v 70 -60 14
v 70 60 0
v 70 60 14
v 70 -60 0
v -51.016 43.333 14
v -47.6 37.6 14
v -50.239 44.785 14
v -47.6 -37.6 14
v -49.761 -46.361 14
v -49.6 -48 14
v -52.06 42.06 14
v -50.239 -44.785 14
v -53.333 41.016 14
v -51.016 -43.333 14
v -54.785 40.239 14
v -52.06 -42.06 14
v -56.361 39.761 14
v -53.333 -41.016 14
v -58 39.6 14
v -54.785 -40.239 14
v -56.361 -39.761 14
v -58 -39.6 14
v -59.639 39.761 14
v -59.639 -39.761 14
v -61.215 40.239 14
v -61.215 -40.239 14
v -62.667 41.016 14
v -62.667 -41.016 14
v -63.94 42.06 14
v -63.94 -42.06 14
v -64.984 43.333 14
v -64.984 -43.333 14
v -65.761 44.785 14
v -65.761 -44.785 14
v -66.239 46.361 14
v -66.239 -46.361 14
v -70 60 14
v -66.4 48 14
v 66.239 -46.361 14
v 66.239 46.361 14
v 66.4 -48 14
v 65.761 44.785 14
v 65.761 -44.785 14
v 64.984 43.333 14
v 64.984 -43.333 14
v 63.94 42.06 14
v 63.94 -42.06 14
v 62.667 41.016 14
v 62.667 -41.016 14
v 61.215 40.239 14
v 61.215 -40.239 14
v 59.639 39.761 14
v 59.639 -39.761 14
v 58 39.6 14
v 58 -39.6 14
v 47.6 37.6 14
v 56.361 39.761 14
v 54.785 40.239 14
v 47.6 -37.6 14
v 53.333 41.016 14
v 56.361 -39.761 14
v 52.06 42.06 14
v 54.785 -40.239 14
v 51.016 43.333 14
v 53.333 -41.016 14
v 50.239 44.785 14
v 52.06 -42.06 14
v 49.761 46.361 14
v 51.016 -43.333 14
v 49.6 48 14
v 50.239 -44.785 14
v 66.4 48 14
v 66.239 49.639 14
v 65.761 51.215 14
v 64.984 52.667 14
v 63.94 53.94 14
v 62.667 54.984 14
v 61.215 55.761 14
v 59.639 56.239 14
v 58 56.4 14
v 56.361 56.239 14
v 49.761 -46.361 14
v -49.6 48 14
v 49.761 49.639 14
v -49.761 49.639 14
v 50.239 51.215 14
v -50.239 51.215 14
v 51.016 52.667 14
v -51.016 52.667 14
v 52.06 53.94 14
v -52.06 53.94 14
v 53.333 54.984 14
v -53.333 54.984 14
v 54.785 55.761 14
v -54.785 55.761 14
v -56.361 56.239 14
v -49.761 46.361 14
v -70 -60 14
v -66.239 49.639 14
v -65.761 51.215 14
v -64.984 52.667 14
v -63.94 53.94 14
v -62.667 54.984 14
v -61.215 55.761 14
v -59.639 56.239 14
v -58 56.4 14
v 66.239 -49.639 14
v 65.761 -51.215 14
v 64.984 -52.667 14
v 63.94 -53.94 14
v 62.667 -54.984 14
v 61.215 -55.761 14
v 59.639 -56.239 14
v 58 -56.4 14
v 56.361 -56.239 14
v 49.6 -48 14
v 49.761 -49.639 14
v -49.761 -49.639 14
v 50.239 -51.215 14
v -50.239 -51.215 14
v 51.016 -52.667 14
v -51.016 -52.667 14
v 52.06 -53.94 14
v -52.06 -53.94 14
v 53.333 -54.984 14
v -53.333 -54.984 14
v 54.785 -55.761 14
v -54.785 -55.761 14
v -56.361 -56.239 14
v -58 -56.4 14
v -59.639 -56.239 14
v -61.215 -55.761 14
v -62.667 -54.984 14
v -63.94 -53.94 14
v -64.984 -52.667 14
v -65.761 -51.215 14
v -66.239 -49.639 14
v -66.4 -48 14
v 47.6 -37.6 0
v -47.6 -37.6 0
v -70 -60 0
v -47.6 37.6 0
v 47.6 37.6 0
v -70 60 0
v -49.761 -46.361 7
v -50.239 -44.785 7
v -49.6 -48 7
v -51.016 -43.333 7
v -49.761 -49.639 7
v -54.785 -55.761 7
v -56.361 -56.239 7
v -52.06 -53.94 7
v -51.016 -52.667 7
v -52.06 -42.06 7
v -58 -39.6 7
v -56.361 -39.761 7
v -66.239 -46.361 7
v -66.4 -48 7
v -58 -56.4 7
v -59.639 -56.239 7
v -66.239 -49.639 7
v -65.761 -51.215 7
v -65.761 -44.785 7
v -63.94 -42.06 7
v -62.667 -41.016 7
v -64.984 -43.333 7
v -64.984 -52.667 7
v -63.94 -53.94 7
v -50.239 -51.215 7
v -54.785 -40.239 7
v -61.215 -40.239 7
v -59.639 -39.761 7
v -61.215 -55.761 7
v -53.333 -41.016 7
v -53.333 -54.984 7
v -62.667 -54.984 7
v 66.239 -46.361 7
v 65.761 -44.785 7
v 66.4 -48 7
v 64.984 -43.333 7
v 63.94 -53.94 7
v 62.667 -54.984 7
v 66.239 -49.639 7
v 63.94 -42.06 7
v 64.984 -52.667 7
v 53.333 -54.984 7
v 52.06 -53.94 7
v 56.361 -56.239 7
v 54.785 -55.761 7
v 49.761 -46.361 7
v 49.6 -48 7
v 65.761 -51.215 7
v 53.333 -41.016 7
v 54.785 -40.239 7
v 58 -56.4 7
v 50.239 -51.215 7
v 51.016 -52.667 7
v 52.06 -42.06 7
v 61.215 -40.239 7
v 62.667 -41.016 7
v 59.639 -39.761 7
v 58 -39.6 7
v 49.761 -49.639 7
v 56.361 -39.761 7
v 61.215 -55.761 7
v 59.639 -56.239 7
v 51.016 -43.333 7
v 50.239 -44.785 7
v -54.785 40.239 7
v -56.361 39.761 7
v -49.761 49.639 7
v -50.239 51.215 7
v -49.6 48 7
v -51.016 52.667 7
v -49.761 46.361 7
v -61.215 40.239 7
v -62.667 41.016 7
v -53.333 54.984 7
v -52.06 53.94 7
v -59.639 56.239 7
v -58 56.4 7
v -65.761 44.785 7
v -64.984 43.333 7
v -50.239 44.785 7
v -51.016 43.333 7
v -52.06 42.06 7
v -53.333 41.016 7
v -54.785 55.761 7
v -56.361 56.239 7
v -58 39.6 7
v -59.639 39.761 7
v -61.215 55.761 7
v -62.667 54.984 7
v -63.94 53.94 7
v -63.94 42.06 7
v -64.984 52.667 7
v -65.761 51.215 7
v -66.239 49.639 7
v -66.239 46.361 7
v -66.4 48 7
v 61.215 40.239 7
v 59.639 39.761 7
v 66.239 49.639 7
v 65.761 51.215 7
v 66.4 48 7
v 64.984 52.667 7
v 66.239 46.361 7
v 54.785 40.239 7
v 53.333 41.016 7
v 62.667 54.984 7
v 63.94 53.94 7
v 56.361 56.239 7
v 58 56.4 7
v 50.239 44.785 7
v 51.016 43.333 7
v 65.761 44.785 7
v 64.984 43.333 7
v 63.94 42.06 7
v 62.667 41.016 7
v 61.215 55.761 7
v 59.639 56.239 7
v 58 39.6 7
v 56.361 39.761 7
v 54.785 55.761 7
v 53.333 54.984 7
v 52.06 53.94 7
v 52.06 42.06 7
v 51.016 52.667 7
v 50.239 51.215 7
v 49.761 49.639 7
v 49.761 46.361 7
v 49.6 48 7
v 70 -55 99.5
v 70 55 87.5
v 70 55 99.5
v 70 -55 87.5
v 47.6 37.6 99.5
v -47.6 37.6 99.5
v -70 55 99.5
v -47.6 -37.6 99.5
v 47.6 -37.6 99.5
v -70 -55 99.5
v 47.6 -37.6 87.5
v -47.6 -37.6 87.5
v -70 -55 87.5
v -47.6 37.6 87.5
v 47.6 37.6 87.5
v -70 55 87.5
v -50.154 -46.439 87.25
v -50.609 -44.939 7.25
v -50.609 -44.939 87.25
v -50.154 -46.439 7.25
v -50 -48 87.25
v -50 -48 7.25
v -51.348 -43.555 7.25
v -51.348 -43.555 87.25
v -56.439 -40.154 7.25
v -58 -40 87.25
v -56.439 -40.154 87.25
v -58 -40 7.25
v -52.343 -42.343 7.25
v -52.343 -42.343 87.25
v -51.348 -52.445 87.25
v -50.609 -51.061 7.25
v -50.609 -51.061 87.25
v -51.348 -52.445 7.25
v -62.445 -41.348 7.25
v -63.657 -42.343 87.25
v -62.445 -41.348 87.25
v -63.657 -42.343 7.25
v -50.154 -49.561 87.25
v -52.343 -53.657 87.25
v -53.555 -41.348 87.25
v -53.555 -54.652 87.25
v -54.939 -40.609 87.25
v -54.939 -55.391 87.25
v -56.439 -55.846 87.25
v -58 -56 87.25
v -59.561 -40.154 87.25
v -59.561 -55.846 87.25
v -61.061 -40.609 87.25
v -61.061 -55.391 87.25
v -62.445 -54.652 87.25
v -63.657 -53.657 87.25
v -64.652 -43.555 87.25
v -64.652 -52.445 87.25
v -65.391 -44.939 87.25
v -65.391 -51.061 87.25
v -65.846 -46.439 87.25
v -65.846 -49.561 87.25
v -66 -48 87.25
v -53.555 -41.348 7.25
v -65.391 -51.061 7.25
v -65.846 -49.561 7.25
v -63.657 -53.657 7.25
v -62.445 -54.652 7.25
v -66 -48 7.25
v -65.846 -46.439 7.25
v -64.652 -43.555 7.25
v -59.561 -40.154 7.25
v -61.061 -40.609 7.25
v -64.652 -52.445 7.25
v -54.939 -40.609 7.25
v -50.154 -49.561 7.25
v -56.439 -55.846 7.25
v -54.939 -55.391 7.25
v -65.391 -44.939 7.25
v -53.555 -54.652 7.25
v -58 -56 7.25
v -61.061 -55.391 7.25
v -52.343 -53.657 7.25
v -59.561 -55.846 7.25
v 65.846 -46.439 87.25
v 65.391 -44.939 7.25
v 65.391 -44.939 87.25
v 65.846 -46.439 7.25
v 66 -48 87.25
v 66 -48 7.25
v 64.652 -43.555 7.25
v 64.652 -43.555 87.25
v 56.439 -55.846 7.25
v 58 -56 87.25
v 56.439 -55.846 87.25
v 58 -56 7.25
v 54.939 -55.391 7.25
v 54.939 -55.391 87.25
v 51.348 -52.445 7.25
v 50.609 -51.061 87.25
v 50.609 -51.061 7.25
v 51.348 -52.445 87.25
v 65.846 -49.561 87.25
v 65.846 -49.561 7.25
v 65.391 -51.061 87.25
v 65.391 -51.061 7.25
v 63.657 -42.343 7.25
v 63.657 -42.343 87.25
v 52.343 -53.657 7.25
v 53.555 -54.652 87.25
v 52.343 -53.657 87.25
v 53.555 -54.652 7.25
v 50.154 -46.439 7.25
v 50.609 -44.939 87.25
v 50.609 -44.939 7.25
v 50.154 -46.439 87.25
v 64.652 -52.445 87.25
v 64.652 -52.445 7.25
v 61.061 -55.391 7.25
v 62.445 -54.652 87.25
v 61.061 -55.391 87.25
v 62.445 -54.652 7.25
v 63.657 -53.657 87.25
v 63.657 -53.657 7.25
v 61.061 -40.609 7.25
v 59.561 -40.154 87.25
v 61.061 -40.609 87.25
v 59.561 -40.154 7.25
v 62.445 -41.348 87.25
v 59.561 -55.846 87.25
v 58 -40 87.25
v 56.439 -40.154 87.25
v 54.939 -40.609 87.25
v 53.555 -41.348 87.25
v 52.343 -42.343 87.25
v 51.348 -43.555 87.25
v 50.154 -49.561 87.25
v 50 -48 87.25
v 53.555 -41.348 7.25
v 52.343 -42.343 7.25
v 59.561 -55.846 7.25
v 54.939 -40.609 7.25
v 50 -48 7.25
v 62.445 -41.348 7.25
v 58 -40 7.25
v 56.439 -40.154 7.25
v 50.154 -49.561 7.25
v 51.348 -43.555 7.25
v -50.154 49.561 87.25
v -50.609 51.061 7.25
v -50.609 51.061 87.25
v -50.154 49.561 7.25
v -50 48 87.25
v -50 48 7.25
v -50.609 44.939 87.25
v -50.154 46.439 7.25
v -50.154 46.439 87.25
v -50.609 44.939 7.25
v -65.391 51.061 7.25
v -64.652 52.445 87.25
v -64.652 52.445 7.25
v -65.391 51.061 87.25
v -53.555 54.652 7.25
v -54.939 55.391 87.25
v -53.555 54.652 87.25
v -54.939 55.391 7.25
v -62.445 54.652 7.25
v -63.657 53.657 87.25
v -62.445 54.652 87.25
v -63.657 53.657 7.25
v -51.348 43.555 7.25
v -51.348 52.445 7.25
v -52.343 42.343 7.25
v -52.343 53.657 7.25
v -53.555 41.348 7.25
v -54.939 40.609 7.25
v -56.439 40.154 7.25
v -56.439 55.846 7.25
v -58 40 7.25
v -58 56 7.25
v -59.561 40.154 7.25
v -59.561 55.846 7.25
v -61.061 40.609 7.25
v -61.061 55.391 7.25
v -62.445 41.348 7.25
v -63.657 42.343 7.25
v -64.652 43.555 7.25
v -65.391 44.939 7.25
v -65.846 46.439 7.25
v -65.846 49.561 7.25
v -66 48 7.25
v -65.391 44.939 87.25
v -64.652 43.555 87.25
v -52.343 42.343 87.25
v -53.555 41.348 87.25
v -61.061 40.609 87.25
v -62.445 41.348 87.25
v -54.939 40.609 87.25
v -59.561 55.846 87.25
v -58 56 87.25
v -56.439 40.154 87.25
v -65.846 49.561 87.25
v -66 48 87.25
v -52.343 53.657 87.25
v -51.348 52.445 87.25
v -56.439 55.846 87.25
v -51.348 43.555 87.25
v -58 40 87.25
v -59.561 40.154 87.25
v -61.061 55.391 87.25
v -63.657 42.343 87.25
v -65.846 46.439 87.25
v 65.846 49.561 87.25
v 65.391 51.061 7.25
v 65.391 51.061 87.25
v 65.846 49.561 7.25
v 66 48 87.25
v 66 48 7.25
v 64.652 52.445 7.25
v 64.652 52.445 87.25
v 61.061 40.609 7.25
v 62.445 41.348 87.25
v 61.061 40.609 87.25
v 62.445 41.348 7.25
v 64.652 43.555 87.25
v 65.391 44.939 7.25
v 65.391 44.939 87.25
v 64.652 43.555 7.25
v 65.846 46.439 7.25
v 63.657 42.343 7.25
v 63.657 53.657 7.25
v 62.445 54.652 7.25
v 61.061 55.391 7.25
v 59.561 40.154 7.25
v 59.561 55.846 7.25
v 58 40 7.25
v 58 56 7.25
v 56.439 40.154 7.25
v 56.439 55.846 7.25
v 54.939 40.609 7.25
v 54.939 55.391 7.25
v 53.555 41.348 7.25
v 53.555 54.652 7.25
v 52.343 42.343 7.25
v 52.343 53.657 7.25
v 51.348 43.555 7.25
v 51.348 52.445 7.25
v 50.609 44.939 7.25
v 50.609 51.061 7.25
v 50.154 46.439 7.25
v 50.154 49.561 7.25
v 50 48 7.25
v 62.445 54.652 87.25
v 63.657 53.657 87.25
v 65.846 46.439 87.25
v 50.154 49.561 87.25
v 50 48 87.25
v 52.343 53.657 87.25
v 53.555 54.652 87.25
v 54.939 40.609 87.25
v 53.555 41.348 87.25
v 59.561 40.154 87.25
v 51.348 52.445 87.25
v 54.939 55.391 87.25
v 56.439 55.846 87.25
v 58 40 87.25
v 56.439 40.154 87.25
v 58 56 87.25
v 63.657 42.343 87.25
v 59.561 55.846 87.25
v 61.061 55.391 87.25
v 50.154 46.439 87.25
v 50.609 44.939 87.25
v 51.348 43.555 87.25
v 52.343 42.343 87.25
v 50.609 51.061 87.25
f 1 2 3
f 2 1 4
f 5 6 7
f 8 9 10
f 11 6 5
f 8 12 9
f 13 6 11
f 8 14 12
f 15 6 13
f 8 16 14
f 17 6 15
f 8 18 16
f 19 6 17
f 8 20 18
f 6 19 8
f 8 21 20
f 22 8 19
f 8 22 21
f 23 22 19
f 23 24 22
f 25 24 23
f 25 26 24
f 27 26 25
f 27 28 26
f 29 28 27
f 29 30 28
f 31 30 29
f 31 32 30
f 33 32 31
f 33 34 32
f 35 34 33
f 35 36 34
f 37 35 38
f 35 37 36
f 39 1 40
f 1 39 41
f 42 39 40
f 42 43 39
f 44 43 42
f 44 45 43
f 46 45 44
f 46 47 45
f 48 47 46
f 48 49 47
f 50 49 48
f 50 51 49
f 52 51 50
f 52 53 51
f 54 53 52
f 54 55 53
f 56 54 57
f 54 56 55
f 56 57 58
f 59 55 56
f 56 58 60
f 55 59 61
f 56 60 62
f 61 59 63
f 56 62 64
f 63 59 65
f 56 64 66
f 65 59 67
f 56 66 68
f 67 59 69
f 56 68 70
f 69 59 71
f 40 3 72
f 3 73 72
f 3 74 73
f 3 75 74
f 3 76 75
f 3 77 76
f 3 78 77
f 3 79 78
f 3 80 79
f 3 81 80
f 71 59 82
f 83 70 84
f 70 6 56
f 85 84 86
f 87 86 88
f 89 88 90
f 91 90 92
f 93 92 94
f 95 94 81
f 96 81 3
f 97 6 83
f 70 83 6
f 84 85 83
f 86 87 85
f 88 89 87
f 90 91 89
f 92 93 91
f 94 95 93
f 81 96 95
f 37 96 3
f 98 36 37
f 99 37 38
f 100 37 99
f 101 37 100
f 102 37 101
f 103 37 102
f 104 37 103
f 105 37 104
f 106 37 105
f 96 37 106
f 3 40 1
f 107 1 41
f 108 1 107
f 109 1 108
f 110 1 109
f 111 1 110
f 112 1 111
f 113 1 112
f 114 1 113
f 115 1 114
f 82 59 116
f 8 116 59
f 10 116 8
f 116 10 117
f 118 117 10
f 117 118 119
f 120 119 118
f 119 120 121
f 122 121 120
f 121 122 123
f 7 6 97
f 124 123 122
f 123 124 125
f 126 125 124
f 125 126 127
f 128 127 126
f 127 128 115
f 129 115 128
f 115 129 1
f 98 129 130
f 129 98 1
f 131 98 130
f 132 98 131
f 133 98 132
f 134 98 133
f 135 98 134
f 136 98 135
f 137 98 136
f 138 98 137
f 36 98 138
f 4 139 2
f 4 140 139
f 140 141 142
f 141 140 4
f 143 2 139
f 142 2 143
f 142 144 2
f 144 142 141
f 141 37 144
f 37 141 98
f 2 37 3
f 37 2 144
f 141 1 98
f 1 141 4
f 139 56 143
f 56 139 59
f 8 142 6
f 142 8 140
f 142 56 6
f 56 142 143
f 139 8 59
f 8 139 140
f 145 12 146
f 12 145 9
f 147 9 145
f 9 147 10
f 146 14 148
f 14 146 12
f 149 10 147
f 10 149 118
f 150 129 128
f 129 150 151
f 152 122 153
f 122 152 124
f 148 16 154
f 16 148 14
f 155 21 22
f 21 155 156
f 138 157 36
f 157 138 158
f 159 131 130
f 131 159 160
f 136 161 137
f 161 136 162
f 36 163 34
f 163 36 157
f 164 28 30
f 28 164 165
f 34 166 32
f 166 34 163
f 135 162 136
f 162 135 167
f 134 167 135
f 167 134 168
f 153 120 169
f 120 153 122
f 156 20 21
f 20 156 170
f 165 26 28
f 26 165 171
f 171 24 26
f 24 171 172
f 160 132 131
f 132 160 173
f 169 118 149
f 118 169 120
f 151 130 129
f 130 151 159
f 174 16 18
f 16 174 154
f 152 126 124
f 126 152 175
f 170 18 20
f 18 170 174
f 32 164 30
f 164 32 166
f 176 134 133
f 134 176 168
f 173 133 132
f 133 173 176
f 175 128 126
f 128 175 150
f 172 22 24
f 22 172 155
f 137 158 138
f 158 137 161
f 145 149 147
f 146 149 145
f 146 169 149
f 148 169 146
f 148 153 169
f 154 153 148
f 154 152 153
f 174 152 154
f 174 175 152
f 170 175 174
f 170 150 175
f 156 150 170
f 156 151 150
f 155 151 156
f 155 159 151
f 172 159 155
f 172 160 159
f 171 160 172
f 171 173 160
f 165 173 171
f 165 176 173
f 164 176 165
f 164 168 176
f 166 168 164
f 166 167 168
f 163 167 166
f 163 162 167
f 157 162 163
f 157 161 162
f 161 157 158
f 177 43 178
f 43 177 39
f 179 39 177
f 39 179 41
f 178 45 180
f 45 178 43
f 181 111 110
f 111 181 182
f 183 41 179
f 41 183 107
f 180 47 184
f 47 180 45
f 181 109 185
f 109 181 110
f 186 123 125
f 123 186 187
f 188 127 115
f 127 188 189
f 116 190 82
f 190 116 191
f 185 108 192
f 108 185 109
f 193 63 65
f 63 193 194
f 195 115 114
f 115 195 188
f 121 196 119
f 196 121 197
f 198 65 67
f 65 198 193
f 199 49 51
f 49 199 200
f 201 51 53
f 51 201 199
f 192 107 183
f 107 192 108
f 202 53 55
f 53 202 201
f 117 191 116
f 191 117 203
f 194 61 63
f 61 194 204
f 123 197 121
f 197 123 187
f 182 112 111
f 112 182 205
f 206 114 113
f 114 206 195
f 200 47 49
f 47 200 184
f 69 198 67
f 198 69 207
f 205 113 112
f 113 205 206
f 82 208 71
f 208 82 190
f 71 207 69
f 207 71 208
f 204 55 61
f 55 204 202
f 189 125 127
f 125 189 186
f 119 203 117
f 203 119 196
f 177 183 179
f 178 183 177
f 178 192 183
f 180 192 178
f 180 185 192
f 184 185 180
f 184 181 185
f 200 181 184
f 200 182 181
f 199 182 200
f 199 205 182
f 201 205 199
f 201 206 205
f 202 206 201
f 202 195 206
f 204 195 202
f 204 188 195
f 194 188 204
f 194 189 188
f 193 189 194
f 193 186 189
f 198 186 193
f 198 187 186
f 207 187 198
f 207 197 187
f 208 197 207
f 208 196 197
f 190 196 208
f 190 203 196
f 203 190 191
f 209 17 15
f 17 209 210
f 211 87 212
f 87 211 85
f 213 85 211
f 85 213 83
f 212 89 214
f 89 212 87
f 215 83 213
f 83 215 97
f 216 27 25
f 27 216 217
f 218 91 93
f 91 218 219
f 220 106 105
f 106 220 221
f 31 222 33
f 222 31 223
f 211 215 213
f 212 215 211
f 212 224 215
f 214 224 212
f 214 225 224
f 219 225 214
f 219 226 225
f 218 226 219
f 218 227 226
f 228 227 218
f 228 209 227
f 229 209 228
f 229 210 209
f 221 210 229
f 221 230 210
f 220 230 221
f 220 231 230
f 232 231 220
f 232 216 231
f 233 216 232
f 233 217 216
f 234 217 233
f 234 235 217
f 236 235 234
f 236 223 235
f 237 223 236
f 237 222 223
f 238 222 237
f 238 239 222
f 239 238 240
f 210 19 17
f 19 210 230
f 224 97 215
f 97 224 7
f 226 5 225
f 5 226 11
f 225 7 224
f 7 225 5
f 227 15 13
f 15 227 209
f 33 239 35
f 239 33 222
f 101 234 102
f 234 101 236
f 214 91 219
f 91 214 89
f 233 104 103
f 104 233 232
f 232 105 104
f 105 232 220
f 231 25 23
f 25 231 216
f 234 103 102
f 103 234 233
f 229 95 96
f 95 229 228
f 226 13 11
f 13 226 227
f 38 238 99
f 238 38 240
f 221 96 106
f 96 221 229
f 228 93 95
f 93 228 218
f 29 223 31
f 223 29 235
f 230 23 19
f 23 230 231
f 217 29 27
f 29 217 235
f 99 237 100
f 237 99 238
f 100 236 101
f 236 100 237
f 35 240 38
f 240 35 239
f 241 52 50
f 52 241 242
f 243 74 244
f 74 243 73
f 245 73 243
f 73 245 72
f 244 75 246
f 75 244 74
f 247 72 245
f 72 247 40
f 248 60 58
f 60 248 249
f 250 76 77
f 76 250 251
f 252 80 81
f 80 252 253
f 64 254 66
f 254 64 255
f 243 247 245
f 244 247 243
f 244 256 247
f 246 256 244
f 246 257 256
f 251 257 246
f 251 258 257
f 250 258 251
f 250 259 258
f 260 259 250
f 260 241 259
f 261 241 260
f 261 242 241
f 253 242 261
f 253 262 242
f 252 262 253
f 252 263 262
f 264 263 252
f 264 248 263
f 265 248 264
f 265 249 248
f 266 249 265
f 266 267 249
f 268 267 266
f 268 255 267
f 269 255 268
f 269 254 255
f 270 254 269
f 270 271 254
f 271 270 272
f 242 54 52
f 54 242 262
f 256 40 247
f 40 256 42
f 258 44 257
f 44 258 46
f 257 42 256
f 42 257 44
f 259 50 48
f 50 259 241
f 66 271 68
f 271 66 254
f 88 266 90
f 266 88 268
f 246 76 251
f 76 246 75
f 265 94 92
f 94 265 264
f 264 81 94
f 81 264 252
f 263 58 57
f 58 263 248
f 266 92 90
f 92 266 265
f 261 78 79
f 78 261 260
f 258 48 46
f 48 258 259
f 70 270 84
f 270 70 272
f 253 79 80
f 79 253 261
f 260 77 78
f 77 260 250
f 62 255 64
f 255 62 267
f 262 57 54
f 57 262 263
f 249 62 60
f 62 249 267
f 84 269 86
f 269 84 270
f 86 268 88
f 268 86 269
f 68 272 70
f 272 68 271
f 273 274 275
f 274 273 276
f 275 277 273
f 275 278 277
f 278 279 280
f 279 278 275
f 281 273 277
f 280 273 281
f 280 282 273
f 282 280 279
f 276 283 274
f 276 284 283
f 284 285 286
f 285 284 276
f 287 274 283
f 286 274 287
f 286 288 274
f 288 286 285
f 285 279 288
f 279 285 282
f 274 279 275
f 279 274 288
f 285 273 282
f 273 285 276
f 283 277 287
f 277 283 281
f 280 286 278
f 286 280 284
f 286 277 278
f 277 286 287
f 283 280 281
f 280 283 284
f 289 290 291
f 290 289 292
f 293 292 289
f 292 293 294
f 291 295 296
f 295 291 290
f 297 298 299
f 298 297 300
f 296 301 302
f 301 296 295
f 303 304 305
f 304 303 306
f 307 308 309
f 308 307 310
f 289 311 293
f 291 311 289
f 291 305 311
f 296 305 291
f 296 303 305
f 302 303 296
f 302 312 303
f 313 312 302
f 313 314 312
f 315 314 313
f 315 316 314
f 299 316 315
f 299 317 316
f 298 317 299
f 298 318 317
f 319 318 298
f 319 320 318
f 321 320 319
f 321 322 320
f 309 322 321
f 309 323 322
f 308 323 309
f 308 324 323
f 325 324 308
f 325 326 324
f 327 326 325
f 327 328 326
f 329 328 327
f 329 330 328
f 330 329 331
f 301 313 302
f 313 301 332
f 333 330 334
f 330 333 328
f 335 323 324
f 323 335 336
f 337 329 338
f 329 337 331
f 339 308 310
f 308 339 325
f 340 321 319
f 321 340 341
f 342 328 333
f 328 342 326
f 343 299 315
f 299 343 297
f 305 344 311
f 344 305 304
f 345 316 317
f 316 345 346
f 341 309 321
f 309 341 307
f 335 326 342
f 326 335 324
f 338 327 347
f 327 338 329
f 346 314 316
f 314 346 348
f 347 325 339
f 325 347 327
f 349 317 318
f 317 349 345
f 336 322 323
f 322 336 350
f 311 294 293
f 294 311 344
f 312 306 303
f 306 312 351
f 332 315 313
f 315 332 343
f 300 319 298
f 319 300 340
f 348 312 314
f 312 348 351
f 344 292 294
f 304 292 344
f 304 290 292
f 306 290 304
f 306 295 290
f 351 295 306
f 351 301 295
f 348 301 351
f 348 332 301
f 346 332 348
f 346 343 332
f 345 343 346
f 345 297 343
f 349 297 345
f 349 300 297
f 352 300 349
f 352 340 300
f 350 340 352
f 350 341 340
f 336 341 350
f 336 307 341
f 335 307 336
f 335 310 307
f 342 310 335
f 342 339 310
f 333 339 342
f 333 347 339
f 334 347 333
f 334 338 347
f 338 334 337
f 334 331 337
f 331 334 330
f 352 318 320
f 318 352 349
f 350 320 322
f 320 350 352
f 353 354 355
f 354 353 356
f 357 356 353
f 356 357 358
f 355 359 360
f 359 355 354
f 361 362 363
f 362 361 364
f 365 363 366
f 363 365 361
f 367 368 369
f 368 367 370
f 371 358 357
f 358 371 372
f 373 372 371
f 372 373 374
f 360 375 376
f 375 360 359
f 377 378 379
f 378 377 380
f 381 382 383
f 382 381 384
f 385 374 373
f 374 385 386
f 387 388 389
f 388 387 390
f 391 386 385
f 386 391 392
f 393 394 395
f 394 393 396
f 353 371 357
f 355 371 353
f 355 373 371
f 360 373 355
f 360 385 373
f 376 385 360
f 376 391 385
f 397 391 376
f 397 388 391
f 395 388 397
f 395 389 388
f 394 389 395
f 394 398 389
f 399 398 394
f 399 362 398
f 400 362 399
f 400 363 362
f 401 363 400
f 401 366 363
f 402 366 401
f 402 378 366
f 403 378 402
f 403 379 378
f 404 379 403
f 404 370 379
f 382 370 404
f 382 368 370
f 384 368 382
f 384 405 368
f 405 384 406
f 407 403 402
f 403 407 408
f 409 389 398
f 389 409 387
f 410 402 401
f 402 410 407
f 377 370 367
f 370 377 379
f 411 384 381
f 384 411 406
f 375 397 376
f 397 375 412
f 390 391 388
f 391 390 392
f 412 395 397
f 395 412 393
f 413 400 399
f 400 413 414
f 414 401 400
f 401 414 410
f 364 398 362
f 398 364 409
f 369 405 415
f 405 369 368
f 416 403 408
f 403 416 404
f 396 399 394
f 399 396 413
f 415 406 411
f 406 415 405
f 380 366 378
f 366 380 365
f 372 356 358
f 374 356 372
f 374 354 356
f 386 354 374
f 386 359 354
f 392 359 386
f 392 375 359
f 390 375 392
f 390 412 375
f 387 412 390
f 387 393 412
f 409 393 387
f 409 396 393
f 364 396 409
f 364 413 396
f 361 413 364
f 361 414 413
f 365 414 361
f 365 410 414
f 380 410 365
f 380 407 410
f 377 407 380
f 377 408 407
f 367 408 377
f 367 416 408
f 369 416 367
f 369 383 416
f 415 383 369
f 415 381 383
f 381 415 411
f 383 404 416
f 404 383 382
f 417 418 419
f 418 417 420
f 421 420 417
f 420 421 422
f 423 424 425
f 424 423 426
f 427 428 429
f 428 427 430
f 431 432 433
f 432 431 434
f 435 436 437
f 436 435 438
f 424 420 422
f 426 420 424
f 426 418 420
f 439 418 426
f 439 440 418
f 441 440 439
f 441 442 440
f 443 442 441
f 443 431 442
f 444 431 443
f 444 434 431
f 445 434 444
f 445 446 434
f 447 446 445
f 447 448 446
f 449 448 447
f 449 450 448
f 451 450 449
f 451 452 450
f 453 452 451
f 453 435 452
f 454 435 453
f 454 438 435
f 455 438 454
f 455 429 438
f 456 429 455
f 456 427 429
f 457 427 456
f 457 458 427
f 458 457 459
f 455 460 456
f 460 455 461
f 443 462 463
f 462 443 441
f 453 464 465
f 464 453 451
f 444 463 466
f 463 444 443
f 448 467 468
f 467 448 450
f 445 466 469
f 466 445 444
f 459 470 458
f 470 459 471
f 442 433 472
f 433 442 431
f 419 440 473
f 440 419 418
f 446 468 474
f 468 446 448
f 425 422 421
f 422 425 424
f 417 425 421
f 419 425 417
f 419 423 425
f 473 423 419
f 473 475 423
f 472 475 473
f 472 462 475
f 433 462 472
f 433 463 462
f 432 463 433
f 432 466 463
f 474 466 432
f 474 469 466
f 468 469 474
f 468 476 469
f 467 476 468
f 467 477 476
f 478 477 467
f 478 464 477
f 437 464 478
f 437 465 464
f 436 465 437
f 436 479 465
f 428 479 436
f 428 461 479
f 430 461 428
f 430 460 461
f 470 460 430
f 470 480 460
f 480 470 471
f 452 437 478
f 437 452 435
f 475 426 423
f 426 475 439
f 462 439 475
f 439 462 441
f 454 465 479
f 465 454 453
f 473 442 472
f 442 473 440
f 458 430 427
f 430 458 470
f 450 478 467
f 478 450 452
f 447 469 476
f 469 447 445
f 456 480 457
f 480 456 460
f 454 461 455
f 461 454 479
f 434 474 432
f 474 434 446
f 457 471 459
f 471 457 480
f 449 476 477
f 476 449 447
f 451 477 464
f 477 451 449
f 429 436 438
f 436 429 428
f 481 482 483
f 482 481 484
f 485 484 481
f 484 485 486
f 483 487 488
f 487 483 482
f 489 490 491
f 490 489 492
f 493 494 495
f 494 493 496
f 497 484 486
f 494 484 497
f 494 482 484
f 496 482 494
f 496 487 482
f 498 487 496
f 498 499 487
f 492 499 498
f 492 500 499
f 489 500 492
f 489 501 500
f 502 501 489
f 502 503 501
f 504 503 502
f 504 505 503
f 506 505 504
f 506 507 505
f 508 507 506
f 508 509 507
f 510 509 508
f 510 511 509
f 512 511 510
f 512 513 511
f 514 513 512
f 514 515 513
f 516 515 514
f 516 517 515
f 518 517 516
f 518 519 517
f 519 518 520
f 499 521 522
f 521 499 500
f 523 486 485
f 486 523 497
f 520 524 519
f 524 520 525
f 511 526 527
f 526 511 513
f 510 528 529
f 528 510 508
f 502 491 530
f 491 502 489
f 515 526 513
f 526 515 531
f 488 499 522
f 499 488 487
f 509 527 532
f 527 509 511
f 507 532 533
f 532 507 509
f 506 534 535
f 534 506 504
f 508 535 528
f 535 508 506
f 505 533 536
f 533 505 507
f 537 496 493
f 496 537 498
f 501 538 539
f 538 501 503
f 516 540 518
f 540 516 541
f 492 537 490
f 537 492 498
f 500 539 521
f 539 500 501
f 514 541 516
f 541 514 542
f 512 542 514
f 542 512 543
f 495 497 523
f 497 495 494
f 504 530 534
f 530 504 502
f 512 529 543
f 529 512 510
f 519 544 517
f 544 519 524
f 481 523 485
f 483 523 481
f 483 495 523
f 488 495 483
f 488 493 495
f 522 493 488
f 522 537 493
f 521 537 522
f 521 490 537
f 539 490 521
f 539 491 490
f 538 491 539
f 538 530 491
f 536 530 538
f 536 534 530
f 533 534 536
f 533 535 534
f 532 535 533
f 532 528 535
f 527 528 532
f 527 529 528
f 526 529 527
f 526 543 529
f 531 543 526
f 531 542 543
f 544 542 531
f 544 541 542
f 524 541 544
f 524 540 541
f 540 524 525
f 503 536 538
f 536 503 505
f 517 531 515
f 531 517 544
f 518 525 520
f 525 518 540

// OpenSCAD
$fn = 32;

// ------------------------------------------------------------------------
// Frame cube: base 140 x 120 mm, posts 80 mm tall
// Every part is its own module, assembly() places every instance.
// ------------------------------------------------------------------------

// --- part 1 ---
module base_frame() {
  difference() {
    translate([-70, -60, 0]) cube([140, 120, 14]);
    translate([-47.6, -37.6, -1]) cube([95.2, 75.2, 16]);
    translate([-58, -48, 7]) cylinder(h = 8, d = 16.8);
    translate([58, -48, 7]) cylinder(h = 8, d = 16.8);
    translate([-58, 48, 7]) cylinder(h = 8, d = 16.8);
    translate([58, 48, 7]) cylinder(h = 8, d = 16.8);
  }
}

// --- part 2 ---
module corner_post() {
  cylinder(h = 80, d = 16);
}

// --- part 3 ---
module top_frame() {
  difference() {
    translate([-70, -55, 0]) cube([140, 110, 12]);
    translate([-47.6, -37.6, -1]) cube([95.2, 75.2, 14]);
  }
}

// --- assembly ---
module assembly() {
  color([0.80, 0.24, 0.20]) translate([0, 0, 0]) rotate([0, 0, 0]) base_frame();
  color([0.20, 0.45, 0.75]) translate([-58, -48, 7.25]) rotate([0, 0, 0]) corner_post();
  color([0.25, 0.62, 0.32]) translate([58, -48, 7.25]) rotate([0, 0, 0]) corner_post();
  color([0.92, 0.70, 0.18]) translate([-58, 48, 7.25]) rotate([0, 0, 0]) corner_post();
  color([0.58, 0.35, 0.70]) translate([58, 48, 7.25]) rotate([0, 0, 0]) corner_post();
  color([0.16, 0.66, 0.66]) translate([0, 0, 87.5]) rotate([0, 0, 0]) top_frame();
}

assembly();
